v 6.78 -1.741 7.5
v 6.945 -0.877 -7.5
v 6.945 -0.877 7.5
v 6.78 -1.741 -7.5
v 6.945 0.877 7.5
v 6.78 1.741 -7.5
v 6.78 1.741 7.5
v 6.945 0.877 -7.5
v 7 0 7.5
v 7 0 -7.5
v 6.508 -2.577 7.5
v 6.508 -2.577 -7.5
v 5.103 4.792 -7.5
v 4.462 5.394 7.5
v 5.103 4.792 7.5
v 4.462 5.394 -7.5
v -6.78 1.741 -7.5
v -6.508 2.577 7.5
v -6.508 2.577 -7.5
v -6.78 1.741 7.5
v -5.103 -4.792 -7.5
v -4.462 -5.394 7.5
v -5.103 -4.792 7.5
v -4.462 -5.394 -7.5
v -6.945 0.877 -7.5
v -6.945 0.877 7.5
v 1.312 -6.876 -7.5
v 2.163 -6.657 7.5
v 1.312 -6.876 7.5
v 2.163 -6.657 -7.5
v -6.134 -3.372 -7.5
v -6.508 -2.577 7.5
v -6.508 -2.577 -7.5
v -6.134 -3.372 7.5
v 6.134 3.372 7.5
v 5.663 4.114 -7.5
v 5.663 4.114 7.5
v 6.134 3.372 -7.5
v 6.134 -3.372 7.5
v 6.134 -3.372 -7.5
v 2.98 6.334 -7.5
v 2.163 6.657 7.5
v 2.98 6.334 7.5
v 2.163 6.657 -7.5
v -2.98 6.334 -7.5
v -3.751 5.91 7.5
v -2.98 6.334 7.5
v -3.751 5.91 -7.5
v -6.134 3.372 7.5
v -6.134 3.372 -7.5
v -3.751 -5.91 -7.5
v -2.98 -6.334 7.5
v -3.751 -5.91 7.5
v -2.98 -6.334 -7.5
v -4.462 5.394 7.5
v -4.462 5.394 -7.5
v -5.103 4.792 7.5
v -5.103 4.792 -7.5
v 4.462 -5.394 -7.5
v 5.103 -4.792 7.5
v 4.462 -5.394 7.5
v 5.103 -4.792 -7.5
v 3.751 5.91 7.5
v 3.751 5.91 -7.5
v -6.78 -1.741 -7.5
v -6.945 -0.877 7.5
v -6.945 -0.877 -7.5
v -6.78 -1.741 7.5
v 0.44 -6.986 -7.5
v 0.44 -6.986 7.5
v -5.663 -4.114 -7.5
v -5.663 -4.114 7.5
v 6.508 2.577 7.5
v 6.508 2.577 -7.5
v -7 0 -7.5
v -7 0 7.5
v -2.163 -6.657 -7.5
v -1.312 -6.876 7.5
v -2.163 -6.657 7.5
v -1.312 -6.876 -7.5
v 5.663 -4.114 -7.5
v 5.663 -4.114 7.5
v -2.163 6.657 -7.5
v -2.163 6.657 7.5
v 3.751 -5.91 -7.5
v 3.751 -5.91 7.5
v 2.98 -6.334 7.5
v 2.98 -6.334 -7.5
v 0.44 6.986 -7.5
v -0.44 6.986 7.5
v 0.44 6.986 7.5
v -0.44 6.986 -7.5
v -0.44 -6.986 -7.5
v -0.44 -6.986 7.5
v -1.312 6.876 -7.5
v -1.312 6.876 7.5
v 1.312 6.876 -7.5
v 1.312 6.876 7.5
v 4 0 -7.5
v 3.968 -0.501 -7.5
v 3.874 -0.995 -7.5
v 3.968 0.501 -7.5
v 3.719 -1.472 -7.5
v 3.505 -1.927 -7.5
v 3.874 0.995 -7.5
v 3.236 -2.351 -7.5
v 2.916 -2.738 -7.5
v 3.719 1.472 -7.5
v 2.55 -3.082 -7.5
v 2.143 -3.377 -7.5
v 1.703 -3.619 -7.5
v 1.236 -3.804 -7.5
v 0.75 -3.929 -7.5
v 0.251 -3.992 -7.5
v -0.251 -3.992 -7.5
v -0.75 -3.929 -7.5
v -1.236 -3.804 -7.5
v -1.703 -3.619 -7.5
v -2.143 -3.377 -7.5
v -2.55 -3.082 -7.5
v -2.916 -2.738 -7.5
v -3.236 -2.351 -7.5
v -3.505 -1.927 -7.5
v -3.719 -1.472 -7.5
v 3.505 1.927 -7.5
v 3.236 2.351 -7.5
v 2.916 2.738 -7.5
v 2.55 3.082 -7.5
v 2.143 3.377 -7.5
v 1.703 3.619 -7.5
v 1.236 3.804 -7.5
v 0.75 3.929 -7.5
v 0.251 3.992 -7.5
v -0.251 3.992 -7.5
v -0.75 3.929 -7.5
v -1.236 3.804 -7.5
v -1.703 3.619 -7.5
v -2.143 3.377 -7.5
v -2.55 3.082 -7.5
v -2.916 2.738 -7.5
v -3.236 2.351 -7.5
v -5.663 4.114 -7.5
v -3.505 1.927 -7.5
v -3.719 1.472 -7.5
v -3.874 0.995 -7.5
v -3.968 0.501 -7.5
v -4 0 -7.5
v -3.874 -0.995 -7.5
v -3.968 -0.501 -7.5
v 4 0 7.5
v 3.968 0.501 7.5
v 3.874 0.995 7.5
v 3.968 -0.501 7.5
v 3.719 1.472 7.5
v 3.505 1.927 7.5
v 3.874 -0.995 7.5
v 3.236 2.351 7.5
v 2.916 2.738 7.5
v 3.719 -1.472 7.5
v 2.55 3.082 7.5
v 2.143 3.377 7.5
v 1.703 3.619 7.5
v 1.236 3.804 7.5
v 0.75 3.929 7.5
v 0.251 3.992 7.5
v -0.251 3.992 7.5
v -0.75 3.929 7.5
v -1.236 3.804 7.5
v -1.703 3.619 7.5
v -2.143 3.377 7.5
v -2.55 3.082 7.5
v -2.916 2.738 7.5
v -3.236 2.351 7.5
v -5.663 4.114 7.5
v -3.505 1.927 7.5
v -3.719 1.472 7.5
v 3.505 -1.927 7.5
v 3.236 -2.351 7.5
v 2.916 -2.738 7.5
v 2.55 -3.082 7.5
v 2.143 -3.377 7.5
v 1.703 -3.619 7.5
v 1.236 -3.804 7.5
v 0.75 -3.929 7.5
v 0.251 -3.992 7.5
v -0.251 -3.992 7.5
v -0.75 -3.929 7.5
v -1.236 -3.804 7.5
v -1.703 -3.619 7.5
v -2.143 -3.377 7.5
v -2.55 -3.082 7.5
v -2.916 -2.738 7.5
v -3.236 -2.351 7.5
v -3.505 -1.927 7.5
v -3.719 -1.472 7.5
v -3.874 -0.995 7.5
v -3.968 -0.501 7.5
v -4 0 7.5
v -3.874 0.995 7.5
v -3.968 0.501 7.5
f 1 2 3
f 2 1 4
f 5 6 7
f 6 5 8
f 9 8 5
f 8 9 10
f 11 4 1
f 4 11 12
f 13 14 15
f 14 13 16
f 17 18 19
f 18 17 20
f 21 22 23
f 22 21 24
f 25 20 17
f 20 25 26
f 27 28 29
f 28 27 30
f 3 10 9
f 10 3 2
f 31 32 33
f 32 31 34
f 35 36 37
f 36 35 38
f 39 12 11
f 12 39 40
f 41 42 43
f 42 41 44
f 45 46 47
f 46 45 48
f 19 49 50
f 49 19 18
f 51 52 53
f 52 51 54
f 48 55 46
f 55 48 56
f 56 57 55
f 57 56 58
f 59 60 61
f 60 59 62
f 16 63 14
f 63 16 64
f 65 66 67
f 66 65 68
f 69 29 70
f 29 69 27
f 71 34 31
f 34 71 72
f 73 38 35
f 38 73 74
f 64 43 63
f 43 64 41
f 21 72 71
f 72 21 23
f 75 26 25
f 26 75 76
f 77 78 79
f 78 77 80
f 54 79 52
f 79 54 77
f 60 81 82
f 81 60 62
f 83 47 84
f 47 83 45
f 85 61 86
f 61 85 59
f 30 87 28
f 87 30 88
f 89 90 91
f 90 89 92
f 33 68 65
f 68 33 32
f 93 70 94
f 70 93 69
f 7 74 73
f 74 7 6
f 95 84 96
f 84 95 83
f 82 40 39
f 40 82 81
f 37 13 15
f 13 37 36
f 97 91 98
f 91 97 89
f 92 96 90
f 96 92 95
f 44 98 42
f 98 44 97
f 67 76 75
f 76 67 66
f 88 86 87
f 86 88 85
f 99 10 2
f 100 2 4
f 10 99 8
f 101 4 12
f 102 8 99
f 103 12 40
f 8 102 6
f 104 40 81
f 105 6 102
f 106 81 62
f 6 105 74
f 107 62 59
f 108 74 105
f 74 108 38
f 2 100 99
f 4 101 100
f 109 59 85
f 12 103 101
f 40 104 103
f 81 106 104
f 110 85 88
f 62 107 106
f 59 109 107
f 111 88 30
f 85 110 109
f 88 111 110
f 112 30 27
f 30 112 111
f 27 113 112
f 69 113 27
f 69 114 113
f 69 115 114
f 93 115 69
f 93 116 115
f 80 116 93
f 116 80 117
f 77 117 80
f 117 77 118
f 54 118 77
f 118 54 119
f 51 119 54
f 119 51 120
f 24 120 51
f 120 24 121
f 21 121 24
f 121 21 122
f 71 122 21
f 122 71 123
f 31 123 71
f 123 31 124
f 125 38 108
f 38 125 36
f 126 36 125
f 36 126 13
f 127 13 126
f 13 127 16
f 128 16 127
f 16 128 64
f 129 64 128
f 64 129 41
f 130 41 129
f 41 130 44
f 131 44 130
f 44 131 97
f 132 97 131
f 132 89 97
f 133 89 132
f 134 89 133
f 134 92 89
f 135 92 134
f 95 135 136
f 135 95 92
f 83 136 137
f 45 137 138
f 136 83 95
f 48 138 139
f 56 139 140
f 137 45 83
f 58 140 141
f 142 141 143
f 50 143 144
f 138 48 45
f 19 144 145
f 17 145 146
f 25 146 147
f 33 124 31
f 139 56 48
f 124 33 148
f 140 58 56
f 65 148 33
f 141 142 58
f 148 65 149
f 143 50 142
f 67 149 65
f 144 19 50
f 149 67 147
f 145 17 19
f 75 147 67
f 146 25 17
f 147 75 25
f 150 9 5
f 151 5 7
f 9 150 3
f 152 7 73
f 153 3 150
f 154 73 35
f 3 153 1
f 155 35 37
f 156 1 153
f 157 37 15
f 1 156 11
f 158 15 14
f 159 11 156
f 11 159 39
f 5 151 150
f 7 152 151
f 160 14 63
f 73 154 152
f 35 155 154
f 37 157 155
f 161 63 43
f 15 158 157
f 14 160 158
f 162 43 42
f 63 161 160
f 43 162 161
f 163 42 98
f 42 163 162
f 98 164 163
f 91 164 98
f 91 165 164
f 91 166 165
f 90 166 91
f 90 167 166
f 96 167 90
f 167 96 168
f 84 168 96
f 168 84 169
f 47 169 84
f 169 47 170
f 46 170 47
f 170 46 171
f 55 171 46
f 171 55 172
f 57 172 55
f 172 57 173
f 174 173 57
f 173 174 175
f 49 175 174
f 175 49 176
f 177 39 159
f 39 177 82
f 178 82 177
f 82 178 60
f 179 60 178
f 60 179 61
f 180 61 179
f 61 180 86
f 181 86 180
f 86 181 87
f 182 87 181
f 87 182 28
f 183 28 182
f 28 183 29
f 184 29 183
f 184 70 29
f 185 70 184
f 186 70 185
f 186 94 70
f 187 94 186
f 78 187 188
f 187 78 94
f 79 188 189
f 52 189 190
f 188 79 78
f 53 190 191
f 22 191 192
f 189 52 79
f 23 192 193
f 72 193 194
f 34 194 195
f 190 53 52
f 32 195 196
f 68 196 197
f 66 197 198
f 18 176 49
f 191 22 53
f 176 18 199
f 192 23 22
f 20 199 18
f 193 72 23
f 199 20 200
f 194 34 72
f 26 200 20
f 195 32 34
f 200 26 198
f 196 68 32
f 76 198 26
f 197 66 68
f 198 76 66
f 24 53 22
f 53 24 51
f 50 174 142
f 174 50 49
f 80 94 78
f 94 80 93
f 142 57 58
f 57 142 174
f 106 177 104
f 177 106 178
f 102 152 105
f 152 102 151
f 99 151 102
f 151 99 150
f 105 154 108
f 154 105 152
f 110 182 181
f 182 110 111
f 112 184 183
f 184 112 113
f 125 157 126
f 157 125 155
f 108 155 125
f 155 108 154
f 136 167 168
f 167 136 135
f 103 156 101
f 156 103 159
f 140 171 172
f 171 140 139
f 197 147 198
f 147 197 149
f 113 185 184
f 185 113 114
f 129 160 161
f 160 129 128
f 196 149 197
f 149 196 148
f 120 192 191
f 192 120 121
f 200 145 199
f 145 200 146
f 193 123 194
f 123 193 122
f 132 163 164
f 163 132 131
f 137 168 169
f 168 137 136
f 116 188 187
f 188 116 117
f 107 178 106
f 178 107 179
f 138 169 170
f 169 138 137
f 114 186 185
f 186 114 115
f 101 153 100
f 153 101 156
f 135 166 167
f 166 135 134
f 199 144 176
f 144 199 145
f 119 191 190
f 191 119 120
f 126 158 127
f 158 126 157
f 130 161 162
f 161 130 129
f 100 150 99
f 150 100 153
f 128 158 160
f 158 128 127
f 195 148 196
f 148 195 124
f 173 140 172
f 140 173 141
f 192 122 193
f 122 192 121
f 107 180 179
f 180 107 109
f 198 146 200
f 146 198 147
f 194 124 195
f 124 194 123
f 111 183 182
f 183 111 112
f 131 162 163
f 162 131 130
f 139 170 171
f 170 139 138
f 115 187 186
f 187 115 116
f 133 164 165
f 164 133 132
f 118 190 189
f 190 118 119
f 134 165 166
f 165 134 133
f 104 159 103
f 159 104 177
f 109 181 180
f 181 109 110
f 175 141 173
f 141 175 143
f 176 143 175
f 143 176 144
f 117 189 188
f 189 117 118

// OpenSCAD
$fn = 50;


difference() {
	union() {
		translate(v = [0, 0, -7.5000000000]) {
			cylinder(h = 15, r = 7.0000000000);
		}
	}
	union() {
		translate(v = [0, 0, -100.0000000000]) {
			cylinder(h = 200, r = 4.0000000000);
		}
	}
}
